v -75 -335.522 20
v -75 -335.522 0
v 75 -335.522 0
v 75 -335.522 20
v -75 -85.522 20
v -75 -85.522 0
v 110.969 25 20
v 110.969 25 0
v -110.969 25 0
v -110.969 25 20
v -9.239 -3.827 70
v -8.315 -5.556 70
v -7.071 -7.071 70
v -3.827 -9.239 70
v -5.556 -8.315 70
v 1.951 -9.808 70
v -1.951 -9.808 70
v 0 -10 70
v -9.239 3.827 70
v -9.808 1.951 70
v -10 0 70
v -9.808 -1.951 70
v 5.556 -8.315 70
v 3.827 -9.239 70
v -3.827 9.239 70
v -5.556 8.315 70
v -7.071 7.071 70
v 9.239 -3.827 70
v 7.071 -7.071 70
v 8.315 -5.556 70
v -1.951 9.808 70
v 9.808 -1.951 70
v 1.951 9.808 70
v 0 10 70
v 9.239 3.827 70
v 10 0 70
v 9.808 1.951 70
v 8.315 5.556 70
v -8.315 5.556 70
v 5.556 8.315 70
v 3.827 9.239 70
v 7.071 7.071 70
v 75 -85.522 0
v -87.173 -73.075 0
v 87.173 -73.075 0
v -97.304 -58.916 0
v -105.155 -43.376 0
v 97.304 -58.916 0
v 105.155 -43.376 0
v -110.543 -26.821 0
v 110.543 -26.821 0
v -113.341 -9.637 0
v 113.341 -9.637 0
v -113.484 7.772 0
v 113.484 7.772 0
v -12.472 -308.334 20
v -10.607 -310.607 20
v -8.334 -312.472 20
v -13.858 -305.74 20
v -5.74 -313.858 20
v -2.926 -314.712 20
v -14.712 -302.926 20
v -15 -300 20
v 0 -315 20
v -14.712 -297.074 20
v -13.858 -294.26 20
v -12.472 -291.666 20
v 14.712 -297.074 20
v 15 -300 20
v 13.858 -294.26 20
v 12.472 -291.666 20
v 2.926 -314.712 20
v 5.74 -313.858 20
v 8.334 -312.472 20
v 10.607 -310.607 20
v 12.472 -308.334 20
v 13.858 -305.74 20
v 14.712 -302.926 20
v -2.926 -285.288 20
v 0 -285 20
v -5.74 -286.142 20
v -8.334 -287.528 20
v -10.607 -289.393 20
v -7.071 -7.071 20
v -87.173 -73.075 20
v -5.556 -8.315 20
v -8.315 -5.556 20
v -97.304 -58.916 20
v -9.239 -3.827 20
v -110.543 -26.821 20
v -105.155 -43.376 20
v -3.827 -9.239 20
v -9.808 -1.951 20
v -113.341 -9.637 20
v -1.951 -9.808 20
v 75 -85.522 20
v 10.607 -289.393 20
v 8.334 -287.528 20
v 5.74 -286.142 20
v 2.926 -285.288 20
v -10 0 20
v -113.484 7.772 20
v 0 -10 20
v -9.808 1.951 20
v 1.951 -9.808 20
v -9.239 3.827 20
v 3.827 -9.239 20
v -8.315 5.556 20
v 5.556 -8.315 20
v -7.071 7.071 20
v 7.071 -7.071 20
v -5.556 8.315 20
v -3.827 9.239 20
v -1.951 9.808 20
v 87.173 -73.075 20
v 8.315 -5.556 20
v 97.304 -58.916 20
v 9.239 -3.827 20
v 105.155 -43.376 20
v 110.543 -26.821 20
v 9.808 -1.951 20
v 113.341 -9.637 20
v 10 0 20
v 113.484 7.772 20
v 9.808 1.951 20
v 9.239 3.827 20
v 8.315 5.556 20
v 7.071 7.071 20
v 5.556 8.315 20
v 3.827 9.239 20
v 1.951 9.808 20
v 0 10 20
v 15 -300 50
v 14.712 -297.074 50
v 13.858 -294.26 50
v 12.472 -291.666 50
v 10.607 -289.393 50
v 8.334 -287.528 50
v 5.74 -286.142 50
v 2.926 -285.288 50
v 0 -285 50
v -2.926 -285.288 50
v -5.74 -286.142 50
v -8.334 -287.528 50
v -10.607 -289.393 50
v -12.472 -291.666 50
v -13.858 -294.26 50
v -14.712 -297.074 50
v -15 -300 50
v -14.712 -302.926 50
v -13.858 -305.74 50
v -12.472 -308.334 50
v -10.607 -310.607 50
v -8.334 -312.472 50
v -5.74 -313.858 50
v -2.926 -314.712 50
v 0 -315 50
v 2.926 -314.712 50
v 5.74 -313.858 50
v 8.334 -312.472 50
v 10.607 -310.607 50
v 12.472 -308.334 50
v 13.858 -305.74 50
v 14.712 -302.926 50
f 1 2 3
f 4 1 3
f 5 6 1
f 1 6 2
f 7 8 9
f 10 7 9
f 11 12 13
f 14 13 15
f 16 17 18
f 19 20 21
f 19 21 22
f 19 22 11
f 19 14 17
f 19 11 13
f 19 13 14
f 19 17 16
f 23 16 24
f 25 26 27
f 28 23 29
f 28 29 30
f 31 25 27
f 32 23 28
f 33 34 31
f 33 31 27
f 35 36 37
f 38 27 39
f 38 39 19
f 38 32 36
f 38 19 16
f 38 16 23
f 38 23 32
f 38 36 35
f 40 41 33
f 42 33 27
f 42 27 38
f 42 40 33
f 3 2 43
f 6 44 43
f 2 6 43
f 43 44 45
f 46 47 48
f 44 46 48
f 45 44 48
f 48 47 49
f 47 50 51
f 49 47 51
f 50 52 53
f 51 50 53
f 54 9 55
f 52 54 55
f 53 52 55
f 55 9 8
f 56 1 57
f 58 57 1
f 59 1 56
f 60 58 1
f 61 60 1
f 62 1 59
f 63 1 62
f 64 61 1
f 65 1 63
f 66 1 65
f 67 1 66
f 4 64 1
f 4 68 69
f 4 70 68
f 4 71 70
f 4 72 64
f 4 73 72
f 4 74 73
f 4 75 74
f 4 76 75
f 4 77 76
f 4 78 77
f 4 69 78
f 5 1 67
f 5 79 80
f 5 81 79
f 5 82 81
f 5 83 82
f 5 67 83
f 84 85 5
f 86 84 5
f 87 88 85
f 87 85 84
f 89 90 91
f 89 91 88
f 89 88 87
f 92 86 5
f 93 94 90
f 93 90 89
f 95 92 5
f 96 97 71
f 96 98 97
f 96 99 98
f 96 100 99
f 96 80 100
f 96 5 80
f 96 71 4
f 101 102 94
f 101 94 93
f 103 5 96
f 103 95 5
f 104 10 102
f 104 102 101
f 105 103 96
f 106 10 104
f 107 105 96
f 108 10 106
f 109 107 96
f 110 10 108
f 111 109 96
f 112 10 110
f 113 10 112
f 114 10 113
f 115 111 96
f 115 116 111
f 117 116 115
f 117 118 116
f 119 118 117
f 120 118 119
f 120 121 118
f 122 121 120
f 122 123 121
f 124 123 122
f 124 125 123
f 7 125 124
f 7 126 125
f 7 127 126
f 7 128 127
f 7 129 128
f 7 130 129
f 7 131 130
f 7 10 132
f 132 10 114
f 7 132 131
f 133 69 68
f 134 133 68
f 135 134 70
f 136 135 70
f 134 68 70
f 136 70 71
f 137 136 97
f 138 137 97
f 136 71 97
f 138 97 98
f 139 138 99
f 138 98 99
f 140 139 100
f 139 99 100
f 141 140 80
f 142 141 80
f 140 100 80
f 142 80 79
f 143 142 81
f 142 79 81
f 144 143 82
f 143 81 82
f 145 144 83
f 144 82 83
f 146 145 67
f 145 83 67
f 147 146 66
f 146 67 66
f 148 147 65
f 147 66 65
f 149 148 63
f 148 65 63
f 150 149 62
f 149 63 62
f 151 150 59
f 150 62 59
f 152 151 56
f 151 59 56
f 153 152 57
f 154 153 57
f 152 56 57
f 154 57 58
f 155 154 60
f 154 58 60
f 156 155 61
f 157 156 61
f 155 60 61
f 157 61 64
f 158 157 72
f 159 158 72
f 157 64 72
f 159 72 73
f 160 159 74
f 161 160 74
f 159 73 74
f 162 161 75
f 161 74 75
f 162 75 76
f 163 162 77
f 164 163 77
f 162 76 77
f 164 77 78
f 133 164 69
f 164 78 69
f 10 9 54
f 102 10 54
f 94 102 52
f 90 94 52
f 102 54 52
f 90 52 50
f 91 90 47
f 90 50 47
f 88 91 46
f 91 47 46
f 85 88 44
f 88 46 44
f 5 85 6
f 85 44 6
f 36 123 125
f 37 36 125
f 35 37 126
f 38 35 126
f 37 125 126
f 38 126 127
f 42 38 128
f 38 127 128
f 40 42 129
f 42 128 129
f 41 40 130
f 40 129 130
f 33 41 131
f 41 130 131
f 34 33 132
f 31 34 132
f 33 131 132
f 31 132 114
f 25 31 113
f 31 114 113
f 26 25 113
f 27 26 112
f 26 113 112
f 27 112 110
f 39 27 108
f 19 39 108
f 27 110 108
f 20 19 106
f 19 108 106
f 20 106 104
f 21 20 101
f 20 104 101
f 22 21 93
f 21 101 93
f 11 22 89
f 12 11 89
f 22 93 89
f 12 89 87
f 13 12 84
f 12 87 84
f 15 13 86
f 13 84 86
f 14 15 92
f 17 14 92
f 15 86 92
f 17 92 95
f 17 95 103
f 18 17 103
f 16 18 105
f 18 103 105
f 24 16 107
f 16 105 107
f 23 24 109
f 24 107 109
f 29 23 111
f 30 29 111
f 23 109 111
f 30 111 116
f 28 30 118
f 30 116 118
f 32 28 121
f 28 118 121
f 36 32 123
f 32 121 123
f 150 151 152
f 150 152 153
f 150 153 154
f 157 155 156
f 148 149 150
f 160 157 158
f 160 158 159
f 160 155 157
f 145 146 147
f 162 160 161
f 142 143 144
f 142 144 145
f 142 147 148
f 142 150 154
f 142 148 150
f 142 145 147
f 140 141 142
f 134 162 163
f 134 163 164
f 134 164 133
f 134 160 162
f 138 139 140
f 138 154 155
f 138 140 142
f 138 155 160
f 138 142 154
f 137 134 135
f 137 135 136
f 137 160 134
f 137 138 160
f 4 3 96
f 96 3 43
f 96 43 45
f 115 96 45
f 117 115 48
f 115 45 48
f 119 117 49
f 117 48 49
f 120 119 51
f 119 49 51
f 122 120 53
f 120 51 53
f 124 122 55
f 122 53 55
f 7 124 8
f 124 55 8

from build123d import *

# Parameters (mm, degrees)
BOSS_EXTRUDE1_DEPTH = 20
BOSS_EXTRUDE2_START = 20
SKETCH1_3_R         = 10
BOSS_EXTRUDE2_DEPTH = 50
SKETCH2_R           = 15
BOSS_EXTRUDE3_DEPTH = 30


with BuildPart() as part:
    # Sketch1 → Boss-Extrude1 (new body)
    with BuildSketch(Plane.XY):
        with BuildLine():
            Line((-75, -335.522292415), (75, -335.522292415))
            Line((75, -335.522292415), (75, -85.522292415))
            ThreePointArc((75, -85.522292415), (108.166019919, -35.201912374), (110.9687456, 25))
            Line((110.9687456, 25), (-110.9687456, 25))
            ThreePointArc((-110.9687456, 25), (-108.166019919, -35.201912374), (-75, -85.522292415))
            Line((-75, -85.522292415), (-75, -335.522292415))
        make_face()
    extrude(amount=BOSS_EXTRUDE1_DEPTH)

    # Sketch1<3> → Boss-Extrude2 (add)
    with BuildSketch(Plane.XY.offset(BOSS_EXTRUDE2_START)):
        Circle(SKETCH1_3_R)
    extrude(amount=BOSS_EXTRUDE2_DEPTH)

    # Sketch2 → Boss-Extrude3 (add)
    with BuildSketch(Plane.XY.offset(20)):
        with Locations((0, -300)):
            Circle(SKETCH2_R)
    extrude(amount=BOSS_EXTRUDE3_DEPTH)


solid = part.part
